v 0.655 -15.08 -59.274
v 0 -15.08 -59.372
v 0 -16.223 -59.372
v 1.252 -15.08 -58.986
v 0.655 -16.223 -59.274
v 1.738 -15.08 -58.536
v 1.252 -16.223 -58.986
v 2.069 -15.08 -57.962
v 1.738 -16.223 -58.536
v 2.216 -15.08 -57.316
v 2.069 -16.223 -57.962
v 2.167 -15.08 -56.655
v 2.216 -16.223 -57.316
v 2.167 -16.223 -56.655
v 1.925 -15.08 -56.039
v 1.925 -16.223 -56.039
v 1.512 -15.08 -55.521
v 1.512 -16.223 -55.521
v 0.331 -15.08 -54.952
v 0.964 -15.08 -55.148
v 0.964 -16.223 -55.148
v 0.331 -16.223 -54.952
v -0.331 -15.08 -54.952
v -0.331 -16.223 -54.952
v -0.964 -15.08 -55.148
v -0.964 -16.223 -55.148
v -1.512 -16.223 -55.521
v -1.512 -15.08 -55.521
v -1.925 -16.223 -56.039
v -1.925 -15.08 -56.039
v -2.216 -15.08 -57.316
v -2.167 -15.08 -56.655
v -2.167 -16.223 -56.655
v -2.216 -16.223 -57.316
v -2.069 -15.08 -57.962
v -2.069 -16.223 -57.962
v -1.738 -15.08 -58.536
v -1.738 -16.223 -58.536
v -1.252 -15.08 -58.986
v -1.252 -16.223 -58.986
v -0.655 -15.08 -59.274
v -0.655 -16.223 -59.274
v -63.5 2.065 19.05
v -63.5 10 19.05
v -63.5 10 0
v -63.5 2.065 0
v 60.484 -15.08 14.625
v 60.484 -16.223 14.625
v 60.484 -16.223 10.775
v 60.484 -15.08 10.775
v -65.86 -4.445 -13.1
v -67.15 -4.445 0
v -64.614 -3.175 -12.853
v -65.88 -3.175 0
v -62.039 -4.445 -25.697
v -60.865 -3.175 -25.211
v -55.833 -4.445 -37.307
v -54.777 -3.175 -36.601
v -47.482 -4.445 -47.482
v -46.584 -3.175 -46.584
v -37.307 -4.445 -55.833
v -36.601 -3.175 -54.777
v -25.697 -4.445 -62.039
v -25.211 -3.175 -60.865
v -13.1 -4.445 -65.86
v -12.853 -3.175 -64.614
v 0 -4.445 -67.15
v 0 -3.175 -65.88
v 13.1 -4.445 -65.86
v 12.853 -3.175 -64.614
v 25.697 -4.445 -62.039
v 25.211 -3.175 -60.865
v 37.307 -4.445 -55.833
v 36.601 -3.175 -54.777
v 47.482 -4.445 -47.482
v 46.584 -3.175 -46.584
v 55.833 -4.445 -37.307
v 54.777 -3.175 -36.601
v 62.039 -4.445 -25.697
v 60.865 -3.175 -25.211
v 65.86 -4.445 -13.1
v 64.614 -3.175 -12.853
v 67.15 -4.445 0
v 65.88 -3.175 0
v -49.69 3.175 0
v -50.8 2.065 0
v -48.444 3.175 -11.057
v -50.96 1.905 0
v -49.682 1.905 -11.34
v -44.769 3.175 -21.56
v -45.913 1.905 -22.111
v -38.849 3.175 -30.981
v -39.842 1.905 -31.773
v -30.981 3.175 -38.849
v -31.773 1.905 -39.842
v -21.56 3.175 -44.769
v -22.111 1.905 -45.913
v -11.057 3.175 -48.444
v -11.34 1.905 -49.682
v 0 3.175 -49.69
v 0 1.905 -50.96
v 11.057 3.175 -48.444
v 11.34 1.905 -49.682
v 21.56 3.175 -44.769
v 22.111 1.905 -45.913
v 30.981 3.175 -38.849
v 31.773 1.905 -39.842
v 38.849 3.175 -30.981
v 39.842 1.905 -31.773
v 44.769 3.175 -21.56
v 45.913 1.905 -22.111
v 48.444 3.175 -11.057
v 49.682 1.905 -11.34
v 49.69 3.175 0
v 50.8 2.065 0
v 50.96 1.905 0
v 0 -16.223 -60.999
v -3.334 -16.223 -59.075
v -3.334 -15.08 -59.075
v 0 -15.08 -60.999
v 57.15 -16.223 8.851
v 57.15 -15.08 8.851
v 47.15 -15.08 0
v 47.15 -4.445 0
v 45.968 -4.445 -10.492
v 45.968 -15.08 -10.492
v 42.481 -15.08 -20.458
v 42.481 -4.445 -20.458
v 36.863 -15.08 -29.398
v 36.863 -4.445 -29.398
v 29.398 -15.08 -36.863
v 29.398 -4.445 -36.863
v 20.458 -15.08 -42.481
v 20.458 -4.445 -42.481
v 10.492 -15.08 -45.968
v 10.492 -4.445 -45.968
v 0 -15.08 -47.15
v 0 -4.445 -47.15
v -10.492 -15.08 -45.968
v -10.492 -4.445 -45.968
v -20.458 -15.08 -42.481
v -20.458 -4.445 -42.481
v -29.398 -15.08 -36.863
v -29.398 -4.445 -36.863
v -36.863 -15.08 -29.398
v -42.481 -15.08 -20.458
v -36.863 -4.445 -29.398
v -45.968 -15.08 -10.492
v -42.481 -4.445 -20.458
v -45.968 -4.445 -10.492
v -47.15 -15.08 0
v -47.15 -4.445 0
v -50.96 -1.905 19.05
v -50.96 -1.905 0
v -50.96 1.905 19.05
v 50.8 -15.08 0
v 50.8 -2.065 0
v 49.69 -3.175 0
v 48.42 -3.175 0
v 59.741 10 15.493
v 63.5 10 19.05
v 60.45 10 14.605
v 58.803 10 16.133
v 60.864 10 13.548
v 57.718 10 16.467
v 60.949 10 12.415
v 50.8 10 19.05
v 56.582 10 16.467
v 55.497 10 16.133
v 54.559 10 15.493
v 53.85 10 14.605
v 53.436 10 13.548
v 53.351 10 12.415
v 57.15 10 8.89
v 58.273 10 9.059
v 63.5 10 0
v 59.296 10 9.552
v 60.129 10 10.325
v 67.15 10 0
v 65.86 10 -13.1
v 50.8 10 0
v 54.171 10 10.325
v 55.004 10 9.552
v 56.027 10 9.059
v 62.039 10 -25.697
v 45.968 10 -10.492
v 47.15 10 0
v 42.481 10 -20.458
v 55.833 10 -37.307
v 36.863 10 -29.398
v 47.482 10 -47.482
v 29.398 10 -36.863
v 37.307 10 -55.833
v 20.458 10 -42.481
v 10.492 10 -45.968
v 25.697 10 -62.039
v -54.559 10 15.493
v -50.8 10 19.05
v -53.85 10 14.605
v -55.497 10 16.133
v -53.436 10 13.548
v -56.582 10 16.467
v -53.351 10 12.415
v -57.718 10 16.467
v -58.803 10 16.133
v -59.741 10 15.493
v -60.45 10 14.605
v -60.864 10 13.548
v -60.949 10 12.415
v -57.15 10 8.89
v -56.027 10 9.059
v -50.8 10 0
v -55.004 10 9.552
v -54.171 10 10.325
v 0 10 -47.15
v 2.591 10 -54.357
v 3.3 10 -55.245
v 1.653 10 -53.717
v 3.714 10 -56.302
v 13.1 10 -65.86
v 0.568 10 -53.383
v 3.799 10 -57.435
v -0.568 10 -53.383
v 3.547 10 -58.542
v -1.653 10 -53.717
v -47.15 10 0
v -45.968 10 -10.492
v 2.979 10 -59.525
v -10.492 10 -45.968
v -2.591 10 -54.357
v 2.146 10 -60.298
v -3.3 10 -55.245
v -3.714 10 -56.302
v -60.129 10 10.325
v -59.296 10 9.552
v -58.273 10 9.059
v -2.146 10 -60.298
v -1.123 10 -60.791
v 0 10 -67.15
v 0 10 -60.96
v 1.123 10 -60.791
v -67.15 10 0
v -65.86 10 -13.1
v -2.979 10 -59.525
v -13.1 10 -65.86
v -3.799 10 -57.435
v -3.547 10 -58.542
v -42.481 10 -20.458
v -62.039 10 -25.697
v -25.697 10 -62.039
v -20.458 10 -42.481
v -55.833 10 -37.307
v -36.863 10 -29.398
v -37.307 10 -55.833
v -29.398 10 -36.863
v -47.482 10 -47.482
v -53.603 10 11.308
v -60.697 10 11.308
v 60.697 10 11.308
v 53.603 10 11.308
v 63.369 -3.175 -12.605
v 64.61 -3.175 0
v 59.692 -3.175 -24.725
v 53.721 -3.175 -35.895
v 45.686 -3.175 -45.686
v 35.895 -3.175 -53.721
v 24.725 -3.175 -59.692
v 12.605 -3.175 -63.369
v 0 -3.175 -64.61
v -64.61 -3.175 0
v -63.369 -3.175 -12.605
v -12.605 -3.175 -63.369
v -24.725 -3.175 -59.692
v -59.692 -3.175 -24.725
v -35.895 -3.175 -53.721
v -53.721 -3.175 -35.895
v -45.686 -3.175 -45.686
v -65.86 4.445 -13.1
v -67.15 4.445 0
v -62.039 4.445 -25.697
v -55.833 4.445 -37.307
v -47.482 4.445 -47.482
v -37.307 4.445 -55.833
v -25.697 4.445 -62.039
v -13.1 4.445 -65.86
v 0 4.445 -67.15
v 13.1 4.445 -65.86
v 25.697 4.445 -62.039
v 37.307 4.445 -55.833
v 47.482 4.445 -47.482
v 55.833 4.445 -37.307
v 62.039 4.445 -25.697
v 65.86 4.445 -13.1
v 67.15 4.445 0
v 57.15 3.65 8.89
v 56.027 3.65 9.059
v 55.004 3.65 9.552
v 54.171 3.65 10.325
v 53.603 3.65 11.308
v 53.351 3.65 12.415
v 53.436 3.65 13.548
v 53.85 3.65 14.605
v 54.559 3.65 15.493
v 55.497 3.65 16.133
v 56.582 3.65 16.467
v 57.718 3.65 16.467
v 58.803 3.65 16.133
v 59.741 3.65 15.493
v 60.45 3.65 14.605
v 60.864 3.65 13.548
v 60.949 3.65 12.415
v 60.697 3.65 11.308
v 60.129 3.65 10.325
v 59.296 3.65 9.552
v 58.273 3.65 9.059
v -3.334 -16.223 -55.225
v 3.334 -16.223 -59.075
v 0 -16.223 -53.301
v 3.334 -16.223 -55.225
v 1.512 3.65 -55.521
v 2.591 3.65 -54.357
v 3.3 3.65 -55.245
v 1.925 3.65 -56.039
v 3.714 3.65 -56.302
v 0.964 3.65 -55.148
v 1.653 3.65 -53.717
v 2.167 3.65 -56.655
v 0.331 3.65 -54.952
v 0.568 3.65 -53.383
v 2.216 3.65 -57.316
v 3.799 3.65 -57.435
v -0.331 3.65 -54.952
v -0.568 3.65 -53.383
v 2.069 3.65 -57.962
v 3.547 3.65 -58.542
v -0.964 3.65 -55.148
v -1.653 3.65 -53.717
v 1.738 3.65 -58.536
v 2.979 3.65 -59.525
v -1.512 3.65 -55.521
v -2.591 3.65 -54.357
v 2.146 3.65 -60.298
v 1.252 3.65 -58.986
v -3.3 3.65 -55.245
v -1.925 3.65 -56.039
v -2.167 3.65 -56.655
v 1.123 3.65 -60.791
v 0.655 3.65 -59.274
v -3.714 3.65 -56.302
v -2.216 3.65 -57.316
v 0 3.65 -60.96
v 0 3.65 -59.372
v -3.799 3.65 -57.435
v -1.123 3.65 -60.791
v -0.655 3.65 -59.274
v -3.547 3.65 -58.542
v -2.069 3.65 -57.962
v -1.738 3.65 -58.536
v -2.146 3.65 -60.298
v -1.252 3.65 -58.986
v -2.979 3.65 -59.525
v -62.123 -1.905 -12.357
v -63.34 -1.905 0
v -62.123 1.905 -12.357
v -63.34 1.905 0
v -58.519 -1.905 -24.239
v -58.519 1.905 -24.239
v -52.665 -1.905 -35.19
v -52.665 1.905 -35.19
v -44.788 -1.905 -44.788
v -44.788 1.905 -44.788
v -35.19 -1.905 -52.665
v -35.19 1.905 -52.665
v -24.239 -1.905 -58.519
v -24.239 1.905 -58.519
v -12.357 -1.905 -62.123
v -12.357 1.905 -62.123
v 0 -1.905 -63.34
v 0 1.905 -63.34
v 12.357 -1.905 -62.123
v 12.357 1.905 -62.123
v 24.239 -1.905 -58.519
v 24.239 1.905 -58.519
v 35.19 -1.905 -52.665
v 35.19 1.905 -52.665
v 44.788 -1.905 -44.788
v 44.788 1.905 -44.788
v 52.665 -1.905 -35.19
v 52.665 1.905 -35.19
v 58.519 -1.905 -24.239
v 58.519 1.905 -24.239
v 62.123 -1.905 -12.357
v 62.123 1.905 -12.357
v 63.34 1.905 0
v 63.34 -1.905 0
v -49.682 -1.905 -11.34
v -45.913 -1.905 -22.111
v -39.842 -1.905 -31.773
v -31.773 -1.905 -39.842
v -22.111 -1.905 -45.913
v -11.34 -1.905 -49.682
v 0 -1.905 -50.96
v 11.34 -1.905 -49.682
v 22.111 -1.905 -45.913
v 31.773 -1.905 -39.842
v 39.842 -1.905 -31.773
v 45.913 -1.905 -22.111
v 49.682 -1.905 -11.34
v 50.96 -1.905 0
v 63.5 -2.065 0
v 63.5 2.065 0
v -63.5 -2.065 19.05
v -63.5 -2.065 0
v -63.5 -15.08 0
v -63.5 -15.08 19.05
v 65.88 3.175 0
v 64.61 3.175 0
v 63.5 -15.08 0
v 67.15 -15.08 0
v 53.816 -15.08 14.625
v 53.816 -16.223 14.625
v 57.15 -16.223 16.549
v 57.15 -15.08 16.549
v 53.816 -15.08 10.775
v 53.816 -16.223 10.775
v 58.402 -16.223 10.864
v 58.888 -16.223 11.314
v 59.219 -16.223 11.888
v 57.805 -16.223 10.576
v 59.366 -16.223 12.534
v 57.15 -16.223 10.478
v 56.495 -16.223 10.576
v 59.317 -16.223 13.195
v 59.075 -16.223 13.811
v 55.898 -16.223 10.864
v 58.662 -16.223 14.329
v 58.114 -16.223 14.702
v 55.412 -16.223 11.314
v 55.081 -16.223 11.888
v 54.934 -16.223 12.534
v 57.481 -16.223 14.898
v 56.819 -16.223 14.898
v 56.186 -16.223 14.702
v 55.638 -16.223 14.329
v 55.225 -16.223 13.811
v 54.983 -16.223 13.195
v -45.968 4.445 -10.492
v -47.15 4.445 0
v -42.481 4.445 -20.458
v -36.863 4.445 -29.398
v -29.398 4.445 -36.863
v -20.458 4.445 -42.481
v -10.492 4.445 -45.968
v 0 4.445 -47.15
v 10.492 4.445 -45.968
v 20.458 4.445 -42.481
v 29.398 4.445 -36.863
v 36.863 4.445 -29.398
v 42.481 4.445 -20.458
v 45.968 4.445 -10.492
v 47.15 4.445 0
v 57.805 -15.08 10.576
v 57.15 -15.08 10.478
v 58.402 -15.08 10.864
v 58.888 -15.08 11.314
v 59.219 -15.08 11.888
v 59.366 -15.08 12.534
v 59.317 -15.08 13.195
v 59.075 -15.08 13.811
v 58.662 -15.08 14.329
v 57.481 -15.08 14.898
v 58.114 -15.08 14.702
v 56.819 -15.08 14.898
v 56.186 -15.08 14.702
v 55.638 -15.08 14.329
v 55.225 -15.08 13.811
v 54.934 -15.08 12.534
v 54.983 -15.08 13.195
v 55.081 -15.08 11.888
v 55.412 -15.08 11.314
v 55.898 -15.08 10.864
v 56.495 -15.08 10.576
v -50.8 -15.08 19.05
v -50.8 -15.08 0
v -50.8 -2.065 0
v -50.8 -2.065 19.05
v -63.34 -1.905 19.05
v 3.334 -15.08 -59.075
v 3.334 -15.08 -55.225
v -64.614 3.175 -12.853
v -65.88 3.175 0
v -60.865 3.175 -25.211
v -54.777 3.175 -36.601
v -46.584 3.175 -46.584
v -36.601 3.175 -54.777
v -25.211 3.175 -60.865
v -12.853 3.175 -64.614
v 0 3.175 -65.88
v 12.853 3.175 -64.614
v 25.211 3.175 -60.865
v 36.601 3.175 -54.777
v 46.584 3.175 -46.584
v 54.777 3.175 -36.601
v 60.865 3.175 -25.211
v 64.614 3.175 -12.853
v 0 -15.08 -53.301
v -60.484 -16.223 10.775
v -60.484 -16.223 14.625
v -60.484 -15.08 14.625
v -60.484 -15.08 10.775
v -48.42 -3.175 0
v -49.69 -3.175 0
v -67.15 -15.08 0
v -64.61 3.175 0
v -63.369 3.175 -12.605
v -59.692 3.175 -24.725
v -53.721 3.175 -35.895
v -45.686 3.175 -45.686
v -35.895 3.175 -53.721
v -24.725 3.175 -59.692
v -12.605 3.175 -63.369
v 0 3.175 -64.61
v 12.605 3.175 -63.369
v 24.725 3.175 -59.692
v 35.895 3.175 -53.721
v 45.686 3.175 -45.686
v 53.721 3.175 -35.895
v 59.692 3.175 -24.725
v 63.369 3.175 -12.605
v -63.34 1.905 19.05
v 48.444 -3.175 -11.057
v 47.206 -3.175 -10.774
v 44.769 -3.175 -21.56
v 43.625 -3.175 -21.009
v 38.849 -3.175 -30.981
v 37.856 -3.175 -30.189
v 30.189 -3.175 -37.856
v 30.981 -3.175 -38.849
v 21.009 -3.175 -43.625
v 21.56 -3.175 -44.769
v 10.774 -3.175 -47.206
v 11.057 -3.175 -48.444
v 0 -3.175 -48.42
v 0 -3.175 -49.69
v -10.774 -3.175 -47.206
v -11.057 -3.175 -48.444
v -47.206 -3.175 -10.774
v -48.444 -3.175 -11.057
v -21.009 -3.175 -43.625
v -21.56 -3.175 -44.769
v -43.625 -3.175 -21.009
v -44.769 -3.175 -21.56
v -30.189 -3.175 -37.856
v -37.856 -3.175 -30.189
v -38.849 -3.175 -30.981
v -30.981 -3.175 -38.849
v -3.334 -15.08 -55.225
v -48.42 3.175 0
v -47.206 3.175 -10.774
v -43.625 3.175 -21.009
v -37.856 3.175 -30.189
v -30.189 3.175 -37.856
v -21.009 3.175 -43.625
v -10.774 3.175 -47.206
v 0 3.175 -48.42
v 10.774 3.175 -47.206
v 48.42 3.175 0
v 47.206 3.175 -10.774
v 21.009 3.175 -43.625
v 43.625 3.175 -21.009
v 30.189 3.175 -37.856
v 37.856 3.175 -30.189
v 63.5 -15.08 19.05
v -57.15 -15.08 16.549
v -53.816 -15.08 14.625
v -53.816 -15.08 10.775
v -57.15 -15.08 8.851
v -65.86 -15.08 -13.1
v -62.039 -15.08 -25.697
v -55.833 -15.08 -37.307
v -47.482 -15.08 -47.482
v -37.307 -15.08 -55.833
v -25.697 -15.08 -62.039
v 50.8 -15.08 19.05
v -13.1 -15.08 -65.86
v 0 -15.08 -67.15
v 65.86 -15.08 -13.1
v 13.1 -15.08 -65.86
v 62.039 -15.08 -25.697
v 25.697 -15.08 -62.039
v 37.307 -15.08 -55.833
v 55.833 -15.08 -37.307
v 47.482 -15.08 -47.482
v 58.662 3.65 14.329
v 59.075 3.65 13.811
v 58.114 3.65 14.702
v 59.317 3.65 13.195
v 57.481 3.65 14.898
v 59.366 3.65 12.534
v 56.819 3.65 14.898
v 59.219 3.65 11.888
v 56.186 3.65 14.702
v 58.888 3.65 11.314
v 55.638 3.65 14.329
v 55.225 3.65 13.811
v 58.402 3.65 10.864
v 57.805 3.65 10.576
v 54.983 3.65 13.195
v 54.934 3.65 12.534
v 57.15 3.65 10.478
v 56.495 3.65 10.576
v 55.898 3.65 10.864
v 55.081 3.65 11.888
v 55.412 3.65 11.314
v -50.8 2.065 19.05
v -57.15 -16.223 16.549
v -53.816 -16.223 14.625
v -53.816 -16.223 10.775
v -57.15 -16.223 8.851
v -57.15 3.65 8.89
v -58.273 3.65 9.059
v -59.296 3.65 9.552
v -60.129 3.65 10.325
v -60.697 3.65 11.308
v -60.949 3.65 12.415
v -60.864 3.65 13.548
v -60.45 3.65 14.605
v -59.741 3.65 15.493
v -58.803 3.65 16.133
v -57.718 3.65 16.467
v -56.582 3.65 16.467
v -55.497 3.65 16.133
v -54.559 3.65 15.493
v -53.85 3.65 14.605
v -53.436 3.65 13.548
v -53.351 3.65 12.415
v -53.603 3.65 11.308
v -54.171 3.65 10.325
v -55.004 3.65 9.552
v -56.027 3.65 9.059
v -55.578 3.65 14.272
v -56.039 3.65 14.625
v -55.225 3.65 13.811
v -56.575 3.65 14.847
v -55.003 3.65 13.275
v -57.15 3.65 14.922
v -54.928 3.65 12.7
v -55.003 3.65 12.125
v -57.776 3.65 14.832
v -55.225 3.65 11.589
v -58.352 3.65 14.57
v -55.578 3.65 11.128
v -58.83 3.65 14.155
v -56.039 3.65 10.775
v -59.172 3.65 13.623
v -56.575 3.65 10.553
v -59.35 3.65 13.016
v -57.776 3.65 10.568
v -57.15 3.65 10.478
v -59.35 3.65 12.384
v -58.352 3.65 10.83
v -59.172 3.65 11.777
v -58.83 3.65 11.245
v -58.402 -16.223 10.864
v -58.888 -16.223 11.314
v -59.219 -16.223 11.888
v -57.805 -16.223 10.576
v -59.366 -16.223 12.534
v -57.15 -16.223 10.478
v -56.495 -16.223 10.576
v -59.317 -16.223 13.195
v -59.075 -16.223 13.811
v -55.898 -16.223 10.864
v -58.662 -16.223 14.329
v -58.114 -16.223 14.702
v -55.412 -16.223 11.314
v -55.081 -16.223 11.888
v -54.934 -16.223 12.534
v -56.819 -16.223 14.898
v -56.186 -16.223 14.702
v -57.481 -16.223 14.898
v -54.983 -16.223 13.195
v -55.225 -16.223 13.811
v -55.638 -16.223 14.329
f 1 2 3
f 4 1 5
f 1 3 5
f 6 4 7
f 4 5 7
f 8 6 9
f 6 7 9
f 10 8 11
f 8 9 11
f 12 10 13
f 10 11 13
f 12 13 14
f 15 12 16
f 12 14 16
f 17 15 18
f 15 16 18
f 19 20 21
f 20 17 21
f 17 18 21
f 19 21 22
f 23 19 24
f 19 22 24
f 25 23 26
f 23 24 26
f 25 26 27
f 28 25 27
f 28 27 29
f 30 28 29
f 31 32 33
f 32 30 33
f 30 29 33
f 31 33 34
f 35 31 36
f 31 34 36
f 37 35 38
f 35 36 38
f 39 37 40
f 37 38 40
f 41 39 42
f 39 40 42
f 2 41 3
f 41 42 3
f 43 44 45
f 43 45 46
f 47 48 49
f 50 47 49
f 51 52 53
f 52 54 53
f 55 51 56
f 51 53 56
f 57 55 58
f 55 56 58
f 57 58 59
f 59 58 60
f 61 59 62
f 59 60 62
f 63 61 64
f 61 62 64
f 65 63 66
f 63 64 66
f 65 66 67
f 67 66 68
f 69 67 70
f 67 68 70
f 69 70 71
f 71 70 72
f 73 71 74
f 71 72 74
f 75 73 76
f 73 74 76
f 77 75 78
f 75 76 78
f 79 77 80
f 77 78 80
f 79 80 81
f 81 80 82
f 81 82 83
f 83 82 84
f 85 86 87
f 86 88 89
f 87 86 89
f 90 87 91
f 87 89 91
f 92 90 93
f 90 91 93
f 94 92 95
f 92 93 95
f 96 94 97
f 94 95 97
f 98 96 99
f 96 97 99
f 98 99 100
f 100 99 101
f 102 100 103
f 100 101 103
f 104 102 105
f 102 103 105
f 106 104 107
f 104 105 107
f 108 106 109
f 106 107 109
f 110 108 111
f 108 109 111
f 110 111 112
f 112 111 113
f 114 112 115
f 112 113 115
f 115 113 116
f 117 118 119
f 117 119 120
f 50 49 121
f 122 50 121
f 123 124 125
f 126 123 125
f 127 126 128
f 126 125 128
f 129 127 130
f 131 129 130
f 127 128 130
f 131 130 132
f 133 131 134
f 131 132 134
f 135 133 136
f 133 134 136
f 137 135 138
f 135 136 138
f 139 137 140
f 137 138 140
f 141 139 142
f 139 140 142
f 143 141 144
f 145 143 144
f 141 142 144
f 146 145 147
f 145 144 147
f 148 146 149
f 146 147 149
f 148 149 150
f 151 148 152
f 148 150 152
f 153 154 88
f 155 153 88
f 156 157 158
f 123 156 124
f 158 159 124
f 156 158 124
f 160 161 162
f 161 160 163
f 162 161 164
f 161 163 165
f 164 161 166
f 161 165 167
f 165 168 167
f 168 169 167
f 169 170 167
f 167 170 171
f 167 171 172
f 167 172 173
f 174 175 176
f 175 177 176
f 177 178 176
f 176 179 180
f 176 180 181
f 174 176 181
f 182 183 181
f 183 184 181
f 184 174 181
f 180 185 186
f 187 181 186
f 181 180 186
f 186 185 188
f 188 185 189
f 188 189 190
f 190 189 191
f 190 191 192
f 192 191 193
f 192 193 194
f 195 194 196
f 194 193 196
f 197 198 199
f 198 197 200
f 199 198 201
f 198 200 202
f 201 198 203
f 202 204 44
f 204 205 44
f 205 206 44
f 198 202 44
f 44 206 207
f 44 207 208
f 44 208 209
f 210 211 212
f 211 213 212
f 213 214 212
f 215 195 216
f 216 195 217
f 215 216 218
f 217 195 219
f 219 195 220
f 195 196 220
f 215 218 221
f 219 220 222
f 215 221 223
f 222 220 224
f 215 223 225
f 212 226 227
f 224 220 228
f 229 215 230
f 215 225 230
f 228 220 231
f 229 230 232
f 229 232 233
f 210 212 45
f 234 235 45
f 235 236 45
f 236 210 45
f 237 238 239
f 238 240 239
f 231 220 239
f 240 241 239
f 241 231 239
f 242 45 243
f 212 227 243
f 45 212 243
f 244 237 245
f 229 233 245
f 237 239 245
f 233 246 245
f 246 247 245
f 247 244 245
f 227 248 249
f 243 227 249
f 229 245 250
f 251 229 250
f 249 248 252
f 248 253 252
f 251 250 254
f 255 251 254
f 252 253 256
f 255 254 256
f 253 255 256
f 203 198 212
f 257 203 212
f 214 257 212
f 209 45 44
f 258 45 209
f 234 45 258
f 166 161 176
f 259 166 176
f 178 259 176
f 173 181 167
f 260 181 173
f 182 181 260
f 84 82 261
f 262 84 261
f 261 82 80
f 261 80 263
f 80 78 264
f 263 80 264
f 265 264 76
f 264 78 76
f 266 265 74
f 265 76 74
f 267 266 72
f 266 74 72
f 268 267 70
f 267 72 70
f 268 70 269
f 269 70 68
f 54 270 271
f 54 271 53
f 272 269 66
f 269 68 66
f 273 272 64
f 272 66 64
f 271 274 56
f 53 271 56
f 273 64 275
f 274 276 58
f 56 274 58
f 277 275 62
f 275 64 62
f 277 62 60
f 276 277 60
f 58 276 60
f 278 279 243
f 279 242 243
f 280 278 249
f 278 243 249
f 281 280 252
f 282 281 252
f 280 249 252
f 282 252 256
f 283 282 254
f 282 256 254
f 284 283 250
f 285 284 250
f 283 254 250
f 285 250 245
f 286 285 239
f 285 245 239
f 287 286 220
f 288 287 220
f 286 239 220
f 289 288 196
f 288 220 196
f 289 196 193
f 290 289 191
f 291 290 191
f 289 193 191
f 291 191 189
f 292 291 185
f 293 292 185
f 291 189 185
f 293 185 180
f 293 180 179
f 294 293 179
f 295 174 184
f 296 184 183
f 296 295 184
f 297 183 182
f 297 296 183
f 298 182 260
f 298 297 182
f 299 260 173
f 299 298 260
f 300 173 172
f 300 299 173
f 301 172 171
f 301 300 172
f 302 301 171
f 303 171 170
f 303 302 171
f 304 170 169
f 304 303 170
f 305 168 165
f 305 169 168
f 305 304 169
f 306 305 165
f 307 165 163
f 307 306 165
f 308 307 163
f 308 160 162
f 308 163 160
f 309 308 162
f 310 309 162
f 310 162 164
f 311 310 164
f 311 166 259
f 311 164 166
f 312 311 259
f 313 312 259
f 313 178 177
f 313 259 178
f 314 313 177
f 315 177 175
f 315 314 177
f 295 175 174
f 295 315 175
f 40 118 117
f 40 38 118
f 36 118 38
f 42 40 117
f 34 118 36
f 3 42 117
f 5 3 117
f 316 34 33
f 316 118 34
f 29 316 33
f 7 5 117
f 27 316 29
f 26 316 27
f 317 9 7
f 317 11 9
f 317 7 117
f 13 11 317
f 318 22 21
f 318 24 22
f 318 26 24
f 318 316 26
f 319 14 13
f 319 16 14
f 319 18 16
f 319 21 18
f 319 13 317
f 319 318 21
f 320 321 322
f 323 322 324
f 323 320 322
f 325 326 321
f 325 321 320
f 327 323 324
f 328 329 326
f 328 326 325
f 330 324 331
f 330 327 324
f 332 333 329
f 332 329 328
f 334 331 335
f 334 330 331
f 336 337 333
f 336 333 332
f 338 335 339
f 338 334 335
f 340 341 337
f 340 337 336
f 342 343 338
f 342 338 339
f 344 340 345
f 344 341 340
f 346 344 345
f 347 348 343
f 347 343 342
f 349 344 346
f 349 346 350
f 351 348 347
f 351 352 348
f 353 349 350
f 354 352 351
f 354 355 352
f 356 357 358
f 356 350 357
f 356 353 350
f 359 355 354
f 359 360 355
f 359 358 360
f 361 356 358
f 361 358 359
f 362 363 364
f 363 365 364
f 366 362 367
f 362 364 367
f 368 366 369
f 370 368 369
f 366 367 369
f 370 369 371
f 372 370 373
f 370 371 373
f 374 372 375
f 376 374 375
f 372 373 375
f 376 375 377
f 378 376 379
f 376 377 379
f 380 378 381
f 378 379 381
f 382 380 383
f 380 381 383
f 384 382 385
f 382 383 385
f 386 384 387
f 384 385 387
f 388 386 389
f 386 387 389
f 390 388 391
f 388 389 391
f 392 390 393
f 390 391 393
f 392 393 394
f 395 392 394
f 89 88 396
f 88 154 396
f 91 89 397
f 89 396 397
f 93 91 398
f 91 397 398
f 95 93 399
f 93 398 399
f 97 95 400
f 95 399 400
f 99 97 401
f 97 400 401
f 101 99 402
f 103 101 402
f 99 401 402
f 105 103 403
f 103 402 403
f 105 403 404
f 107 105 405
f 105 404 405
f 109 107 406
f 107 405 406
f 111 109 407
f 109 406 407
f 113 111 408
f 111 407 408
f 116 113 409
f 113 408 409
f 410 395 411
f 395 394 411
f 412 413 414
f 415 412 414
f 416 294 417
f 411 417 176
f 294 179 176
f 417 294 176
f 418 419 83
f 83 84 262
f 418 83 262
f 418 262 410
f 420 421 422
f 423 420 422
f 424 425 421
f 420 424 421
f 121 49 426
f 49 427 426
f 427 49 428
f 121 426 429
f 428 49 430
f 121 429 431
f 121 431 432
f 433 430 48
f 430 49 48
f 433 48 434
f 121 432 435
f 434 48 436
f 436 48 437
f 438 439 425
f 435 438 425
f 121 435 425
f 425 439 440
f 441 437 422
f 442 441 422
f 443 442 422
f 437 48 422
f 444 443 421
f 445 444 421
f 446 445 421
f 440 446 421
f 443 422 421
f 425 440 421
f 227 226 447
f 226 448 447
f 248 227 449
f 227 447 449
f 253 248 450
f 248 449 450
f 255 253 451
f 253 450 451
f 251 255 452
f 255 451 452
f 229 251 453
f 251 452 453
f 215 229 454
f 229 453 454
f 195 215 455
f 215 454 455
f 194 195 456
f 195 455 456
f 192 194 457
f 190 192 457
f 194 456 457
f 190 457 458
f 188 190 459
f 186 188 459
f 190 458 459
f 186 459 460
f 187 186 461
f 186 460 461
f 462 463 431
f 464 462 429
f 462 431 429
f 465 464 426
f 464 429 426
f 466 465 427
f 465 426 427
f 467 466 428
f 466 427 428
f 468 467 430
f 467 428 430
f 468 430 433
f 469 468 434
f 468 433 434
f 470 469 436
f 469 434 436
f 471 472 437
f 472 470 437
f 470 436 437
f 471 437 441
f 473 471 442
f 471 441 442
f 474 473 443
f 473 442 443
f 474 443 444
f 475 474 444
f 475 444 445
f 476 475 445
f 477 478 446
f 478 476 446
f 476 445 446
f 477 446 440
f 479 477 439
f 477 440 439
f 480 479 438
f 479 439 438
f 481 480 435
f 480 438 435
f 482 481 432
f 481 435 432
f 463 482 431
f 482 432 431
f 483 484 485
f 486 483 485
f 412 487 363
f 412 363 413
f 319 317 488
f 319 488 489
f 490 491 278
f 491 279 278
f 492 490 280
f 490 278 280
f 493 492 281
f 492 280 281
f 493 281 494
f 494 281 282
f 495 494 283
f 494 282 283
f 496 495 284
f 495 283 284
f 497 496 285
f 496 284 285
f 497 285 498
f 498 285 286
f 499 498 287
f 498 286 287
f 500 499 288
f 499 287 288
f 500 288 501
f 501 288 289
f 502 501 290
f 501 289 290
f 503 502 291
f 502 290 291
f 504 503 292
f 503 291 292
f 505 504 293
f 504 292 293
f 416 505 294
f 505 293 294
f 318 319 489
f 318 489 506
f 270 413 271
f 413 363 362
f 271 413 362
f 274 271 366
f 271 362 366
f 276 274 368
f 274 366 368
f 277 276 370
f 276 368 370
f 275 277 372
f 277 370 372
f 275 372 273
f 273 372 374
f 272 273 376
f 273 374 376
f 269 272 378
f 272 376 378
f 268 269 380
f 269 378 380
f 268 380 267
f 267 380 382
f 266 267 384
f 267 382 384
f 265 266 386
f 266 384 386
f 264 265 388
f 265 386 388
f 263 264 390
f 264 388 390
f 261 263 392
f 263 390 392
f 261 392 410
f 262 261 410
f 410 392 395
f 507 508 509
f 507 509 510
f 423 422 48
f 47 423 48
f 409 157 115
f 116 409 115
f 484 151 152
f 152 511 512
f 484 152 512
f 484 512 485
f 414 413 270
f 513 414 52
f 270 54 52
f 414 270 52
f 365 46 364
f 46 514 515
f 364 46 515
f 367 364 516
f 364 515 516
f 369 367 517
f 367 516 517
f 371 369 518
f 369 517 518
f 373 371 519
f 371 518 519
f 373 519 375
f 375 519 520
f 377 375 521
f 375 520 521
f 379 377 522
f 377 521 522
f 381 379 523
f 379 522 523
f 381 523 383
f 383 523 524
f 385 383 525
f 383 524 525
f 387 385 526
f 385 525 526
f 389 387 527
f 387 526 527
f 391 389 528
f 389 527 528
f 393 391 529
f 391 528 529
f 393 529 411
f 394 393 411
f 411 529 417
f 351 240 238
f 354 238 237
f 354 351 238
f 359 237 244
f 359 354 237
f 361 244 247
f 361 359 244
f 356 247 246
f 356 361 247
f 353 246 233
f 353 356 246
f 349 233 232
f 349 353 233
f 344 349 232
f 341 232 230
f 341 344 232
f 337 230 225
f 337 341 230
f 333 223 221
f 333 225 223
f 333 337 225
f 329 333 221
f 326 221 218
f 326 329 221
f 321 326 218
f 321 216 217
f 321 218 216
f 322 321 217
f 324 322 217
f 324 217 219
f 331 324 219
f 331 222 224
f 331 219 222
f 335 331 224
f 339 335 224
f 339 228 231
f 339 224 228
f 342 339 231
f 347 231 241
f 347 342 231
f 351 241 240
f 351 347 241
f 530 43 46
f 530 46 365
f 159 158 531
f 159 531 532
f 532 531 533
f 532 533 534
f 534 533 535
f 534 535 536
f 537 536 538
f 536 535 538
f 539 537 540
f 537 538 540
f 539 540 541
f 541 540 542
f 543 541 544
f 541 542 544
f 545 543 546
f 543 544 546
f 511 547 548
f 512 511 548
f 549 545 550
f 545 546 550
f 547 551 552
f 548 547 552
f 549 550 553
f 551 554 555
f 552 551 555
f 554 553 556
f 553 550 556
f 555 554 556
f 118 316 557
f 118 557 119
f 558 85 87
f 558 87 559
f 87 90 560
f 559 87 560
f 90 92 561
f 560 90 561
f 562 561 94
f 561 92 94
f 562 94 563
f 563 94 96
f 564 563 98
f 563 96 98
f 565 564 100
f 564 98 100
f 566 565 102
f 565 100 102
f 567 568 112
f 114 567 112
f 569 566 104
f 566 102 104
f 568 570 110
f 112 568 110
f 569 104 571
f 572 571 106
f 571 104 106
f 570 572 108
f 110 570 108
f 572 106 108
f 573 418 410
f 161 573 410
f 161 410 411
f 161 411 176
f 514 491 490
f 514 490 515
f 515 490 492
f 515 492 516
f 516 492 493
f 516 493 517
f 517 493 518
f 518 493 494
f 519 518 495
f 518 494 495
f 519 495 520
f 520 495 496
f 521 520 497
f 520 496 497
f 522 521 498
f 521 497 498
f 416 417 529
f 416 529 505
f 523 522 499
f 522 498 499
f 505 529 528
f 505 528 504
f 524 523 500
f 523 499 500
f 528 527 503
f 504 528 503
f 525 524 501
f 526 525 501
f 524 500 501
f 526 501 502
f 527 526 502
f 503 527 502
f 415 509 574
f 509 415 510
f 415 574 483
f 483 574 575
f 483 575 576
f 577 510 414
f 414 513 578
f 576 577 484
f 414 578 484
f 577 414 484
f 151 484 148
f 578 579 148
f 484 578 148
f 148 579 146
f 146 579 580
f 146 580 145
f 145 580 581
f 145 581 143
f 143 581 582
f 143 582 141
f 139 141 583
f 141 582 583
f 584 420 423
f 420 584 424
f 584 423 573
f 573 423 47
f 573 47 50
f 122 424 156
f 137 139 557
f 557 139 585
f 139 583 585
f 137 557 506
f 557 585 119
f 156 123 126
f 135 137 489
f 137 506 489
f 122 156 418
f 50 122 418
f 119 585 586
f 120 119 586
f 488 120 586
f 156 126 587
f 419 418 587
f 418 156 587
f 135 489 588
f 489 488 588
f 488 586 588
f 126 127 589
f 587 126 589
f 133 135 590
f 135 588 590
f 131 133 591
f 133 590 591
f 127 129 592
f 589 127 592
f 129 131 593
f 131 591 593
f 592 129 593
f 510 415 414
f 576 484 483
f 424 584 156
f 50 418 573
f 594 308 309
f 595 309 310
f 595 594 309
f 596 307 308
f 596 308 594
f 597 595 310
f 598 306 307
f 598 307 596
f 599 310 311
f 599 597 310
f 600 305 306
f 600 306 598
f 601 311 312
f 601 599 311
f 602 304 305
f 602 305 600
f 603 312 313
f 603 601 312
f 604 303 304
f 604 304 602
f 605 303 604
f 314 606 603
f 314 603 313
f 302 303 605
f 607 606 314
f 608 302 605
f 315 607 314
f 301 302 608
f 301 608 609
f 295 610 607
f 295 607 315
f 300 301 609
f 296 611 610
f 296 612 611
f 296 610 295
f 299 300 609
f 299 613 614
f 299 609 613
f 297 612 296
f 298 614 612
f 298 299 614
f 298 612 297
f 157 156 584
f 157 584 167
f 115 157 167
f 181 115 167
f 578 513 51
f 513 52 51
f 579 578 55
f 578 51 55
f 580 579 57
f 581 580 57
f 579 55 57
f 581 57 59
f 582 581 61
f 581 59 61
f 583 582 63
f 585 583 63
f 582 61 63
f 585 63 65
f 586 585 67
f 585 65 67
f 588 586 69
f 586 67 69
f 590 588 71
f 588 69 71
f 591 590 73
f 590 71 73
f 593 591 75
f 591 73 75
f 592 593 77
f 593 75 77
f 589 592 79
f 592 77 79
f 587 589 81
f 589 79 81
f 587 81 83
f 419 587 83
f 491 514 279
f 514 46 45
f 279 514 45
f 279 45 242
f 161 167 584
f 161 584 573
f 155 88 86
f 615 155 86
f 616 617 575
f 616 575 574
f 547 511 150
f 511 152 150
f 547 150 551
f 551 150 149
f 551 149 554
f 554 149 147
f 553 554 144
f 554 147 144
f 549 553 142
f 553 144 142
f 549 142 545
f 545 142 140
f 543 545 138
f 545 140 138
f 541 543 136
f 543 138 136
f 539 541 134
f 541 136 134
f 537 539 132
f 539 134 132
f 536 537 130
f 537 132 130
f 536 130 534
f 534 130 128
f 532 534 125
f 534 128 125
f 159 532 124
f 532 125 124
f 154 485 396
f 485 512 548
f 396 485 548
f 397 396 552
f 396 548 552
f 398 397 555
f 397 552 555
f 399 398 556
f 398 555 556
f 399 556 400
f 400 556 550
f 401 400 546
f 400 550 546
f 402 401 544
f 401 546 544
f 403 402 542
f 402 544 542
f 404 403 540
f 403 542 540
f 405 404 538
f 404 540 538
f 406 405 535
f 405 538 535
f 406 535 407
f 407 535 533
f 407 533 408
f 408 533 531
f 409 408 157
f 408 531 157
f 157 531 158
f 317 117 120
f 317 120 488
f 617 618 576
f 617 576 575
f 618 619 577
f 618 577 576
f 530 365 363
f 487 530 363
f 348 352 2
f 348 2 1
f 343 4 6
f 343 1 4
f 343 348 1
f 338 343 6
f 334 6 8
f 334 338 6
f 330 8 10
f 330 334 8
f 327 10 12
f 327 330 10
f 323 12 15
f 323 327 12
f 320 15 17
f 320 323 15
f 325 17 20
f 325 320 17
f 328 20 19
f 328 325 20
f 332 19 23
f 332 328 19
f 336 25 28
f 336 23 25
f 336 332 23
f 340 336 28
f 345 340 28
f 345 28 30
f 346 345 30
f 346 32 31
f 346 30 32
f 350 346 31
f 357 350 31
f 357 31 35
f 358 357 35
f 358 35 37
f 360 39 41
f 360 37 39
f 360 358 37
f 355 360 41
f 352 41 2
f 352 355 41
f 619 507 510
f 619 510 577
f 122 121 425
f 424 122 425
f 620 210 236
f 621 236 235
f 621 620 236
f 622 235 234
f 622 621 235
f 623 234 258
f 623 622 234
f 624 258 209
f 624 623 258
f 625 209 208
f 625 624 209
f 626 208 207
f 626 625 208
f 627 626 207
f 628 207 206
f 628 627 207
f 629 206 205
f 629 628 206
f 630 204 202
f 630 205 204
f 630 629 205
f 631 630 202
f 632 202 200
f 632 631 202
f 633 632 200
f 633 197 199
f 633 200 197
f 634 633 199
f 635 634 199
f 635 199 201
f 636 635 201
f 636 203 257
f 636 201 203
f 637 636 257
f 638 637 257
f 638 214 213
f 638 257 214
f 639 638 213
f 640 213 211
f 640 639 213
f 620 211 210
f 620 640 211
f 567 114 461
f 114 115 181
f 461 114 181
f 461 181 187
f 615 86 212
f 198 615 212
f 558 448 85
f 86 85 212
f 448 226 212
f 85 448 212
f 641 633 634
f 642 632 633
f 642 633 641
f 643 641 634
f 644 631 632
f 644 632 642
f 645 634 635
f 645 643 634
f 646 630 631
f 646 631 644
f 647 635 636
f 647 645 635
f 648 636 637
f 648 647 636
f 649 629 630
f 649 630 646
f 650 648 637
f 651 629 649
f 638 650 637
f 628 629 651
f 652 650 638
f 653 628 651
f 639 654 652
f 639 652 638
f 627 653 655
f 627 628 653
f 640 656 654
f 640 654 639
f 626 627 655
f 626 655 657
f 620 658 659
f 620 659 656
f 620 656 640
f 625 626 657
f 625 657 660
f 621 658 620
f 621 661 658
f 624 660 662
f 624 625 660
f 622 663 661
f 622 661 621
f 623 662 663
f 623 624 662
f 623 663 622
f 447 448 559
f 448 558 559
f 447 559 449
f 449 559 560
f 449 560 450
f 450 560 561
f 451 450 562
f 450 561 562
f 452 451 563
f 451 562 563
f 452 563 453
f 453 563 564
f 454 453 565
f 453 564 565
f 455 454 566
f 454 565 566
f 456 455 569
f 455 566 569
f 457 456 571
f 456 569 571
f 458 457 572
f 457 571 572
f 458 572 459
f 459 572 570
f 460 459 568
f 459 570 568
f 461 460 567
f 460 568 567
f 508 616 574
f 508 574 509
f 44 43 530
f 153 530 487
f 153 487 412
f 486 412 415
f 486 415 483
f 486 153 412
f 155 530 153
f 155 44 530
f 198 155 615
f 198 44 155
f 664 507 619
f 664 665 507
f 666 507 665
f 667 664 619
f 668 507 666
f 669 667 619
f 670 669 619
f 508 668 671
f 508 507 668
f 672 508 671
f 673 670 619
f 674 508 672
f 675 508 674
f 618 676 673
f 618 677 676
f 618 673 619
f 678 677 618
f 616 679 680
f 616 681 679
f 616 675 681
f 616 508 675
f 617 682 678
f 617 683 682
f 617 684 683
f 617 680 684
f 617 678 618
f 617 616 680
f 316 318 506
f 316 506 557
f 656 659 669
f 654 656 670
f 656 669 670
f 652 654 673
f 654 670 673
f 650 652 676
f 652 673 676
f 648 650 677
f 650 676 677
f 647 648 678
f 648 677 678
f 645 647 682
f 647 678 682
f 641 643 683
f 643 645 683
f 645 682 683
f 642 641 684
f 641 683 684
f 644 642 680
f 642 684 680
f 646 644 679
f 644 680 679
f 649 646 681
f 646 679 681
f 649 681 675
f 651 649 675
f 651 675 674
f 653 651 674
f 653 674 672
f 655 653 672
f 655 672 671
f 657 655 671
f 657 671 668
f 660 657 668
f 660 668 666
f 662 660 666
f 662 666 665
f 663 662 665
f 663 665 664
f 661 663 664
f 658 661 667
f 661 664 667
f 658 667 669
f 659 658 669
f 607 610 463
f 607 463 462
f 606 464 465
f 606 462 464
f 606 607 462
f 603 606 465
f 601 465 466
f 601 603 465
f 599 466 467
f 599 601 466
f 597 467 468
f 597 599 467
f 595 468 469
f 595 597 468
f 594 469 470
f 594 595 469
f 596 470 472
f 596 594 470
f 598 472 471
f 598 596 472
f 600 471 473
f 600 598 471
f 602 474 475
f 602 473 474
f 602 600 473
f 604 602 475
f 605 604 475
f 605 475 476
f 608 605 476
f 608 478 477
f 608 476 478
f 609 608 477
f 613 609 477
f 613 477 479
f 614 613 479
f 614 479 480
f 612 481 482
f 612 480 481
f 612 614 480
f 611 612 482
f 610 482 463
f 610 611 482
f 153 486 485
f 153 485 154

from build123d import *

# Parameters (mm, degrees)
REVOLVE1_ANGLE          = 180
BOSS_EXTRUDE1_DEPTH     = 5.08
BOSS_EXTRUDE2_OUTLINE_W = 12.7
BOSS_EXTRUDE2_OUTLINE_H = 25.08
BOSS_EXTRUDE2_DEPTH     = 19.05
CUT_EXTRUDE2_DEPTH      = 99.22042252
CUT_EXTRUDE2_DEPTH_BACK = 99.22042252
SKETCH5_R               = 2.2225
CUT_EXTRUDE3_DEPTH      = 99.22042252
CUT_EXTRUDE3_DEPTH_BACK = 6.35
SKETCH7_R               = 3.81
BOSS_EXTRUDE3_START     = 1.143
SKETCH5_8_R             = 2.2225
BOSS_EXTRUDE3_DEPTH     = 1.143


# Read off the part's stored shape, not the designer's step: Boss-Extrude2
with BuildPart() as part:
    # Sketch1 → Revolve1 (revolve)
    with BuildSketch(Plane.XY):
        Polygon((-67.15, 10), (-47.15, 10), (-47.15, 4.445), (-48.42, 3.175), (-49.69, 3.175), (-50.96, 1.905), (-50.96, -1.905), (-49.69, -3.175), (-48.42, -3.175), (-47.15, -4.445), (-47.15, -10), (-67.15, -10), (-67.15, -4.445), (-65.88, -3.175), (-64.61, -3.175), (-63.34, -1.905), (-63.34, 1.905), (-64.61, 3.175), (-65.88, 3.175), (-67.15, 4.445), align=None)
    revolve(axis=Axis((0, 0, 0), (0, -1, 0)), revolution_arc=REVOLVE1_ANGLE)

    # Sketch3 → Boss-Extrude1 (add)
    with BuildSketch(Plane.XZ.offset(10)):
        with BuildLine():
            Line((-47.15, 0), (-67.15, 0))
            ThreePointArc((-67.15, 0), (0, -67.15), (67.15, 0))
            Line((67.15, 0), (47.15, 0))
            ThreePointArc((47.15, 0), (0, -47.15), (-47.15, 0))
        make_face()
    extrude(amount=BOSS_EXTRUDE1_DEPTH)

    # Boss-Extrude2 outline → Boss-Extrude2 (add)
    with BuildSketch(Plane.XY):
        Polygon((-50.8, 10), (-63.5, 10), (-63.5, 2.065), (-63.34, 1.905), (-63.34, -1.905), (-63.5, -2.065), (-63.5, -15.08), (-50.8, -15.08), (-50.8, -2.065), (-50.96, -1.905), (-50.96, 1.905), (-50.8, 2.065), align=None)
        with Locations((57.15, -2.54)):
            Rectangle(BOSS_EXTRUDE2_OUTLINE_W, BOSS_EXTRUDE2_OUTLINE_H)
    extrude(amount=BOSS_EXTRUDE2_DEPTH)

    # Sketch5 → Cut-Extrude2 (cut, two sides: drawn at the far end of the back side and taken through both)
    with BuildSketch(Plane.XZ.offset(15.08).offset(-CUT_EXTRUDE2_DEPTH_BACK)):
        with BuildLine():
            ThreePointArc((-54.9275, 12.7), (-55.578455179, 14.271544821), (-57.15, 14.9225))
            Line((-57.15, 14.9225), (-57.15, 10.4775))
            ThreePointArc((-57.15, 10.4775), (-55.578455179, 11.128455179), (-54.9275, 12.7))
        make_face()
        with BuildLine():
            Line((-57.15, 10.4775), (-57.15, 14.9225))
            ThreePointArc((-57.15, 14.9225), (-59.3725, 12.7), (-57.15, 10.4775))
        make_face()
        with Locations(Location((0, -57.15, 0), (0, 0, 270))):
            Circle(SKETCH5_R)
        with Locations(Location((57.15, 12.7, 0), (0, 0, 270))):
            Circle(SKETCH5_R)
    extrude(amount=CUT_EXTRUDE2_DEPTH + CUT_EXTRUDE2_DEPTH_BACK, mode=Mode.SUBTRACT)

    # Sketch7 → Cut-Extrude3 (cut, two sides: drawn at the far end of the back side and taken through both)
    with BuildSketch(Plane(origin=(0, 10, 0), x_dir=(1, 0, 0), z_dir=(0, 1, 0)).offset(-CUT_EXTRUDE3_DEPTH_BACK)):
        with Locations(Location((0, 57.15, 0), (0, 0, 90))):
            Circle(SKETCH7_R)
        with Locations(Location((-57.15, -12.7, 0), (0, 0, 90))):
            Circle(SKETCH7_R)
        with Locations(Location((57.15, -12.7, 0), (0, 0, 90))):
            Circle(SKETCH7_R)
    extrude(amount=CUT_EXTRUDE3_DEPTH + CUT_EXTRUDE3_DEPTH_BACK, mode=Mode.SUBTRACT)

    # Sketch5<8> → Boss-Extrude3 (add)
    # profile 1 of 3: a face of its own
    with BuildSketch(Plane.XZ.offset(15.08).offset(BOSS_EXTRUDE3_START)):
        Polygon((-57.15, 16.54948292), (-60.48375, 14.62474146), (-60.48375, 10.77525854), (-57.15, 8.85051708), (-53.81625, 10.77525854), (-53.81625, 14.62474146), align=None)
        with Locations(Location((-57.15, 12.7, 0), (0, 0, 270))):
            Circle(SKETCH5_8_R, mode=Mode.SUBTRACT)
    # profile 2 of 3: a face of its own
    with BuildSketch(Plane.XZ.offset(15.08).offset(BOSS_EXTRUDE3_START)):
        Polygon((0, -60.99948292), (3.33375, -59.07474146), (3.33375, -55.22525854), (0, -53.30051708), (-3.33375, -55.22525854), (-3.33375, -59.07474146), align=None)
        with Locations(Location((0, -57.15, 0), (0, 0, 270))):
            Circle(SKETCH5_8_R, mode=Mode.SUBTRACT)
    # profile 3 of 3: a face of its own
    with BuildSketch(Plane.XZ.offset(15.08).offset(BOSS_EXTRUDE3_START)):
        Polygon((53.81625, 14.62474146), (57.15, 16.54948292), (60.48375, 14.62474146), (60.48375, 10.77525854), (57.15, 8.85051708), (53.81625, 10.77525854), align=None)
        with Locations(Location((57.15, 12.7, 0), (0, 0, 270))):
            Circle(SKETCH5_8_R, mode=Mode.SUBTRACT)
    extrude(amount=-BOSS_EXTRUDE3_DEPTH)


solid = part.part
